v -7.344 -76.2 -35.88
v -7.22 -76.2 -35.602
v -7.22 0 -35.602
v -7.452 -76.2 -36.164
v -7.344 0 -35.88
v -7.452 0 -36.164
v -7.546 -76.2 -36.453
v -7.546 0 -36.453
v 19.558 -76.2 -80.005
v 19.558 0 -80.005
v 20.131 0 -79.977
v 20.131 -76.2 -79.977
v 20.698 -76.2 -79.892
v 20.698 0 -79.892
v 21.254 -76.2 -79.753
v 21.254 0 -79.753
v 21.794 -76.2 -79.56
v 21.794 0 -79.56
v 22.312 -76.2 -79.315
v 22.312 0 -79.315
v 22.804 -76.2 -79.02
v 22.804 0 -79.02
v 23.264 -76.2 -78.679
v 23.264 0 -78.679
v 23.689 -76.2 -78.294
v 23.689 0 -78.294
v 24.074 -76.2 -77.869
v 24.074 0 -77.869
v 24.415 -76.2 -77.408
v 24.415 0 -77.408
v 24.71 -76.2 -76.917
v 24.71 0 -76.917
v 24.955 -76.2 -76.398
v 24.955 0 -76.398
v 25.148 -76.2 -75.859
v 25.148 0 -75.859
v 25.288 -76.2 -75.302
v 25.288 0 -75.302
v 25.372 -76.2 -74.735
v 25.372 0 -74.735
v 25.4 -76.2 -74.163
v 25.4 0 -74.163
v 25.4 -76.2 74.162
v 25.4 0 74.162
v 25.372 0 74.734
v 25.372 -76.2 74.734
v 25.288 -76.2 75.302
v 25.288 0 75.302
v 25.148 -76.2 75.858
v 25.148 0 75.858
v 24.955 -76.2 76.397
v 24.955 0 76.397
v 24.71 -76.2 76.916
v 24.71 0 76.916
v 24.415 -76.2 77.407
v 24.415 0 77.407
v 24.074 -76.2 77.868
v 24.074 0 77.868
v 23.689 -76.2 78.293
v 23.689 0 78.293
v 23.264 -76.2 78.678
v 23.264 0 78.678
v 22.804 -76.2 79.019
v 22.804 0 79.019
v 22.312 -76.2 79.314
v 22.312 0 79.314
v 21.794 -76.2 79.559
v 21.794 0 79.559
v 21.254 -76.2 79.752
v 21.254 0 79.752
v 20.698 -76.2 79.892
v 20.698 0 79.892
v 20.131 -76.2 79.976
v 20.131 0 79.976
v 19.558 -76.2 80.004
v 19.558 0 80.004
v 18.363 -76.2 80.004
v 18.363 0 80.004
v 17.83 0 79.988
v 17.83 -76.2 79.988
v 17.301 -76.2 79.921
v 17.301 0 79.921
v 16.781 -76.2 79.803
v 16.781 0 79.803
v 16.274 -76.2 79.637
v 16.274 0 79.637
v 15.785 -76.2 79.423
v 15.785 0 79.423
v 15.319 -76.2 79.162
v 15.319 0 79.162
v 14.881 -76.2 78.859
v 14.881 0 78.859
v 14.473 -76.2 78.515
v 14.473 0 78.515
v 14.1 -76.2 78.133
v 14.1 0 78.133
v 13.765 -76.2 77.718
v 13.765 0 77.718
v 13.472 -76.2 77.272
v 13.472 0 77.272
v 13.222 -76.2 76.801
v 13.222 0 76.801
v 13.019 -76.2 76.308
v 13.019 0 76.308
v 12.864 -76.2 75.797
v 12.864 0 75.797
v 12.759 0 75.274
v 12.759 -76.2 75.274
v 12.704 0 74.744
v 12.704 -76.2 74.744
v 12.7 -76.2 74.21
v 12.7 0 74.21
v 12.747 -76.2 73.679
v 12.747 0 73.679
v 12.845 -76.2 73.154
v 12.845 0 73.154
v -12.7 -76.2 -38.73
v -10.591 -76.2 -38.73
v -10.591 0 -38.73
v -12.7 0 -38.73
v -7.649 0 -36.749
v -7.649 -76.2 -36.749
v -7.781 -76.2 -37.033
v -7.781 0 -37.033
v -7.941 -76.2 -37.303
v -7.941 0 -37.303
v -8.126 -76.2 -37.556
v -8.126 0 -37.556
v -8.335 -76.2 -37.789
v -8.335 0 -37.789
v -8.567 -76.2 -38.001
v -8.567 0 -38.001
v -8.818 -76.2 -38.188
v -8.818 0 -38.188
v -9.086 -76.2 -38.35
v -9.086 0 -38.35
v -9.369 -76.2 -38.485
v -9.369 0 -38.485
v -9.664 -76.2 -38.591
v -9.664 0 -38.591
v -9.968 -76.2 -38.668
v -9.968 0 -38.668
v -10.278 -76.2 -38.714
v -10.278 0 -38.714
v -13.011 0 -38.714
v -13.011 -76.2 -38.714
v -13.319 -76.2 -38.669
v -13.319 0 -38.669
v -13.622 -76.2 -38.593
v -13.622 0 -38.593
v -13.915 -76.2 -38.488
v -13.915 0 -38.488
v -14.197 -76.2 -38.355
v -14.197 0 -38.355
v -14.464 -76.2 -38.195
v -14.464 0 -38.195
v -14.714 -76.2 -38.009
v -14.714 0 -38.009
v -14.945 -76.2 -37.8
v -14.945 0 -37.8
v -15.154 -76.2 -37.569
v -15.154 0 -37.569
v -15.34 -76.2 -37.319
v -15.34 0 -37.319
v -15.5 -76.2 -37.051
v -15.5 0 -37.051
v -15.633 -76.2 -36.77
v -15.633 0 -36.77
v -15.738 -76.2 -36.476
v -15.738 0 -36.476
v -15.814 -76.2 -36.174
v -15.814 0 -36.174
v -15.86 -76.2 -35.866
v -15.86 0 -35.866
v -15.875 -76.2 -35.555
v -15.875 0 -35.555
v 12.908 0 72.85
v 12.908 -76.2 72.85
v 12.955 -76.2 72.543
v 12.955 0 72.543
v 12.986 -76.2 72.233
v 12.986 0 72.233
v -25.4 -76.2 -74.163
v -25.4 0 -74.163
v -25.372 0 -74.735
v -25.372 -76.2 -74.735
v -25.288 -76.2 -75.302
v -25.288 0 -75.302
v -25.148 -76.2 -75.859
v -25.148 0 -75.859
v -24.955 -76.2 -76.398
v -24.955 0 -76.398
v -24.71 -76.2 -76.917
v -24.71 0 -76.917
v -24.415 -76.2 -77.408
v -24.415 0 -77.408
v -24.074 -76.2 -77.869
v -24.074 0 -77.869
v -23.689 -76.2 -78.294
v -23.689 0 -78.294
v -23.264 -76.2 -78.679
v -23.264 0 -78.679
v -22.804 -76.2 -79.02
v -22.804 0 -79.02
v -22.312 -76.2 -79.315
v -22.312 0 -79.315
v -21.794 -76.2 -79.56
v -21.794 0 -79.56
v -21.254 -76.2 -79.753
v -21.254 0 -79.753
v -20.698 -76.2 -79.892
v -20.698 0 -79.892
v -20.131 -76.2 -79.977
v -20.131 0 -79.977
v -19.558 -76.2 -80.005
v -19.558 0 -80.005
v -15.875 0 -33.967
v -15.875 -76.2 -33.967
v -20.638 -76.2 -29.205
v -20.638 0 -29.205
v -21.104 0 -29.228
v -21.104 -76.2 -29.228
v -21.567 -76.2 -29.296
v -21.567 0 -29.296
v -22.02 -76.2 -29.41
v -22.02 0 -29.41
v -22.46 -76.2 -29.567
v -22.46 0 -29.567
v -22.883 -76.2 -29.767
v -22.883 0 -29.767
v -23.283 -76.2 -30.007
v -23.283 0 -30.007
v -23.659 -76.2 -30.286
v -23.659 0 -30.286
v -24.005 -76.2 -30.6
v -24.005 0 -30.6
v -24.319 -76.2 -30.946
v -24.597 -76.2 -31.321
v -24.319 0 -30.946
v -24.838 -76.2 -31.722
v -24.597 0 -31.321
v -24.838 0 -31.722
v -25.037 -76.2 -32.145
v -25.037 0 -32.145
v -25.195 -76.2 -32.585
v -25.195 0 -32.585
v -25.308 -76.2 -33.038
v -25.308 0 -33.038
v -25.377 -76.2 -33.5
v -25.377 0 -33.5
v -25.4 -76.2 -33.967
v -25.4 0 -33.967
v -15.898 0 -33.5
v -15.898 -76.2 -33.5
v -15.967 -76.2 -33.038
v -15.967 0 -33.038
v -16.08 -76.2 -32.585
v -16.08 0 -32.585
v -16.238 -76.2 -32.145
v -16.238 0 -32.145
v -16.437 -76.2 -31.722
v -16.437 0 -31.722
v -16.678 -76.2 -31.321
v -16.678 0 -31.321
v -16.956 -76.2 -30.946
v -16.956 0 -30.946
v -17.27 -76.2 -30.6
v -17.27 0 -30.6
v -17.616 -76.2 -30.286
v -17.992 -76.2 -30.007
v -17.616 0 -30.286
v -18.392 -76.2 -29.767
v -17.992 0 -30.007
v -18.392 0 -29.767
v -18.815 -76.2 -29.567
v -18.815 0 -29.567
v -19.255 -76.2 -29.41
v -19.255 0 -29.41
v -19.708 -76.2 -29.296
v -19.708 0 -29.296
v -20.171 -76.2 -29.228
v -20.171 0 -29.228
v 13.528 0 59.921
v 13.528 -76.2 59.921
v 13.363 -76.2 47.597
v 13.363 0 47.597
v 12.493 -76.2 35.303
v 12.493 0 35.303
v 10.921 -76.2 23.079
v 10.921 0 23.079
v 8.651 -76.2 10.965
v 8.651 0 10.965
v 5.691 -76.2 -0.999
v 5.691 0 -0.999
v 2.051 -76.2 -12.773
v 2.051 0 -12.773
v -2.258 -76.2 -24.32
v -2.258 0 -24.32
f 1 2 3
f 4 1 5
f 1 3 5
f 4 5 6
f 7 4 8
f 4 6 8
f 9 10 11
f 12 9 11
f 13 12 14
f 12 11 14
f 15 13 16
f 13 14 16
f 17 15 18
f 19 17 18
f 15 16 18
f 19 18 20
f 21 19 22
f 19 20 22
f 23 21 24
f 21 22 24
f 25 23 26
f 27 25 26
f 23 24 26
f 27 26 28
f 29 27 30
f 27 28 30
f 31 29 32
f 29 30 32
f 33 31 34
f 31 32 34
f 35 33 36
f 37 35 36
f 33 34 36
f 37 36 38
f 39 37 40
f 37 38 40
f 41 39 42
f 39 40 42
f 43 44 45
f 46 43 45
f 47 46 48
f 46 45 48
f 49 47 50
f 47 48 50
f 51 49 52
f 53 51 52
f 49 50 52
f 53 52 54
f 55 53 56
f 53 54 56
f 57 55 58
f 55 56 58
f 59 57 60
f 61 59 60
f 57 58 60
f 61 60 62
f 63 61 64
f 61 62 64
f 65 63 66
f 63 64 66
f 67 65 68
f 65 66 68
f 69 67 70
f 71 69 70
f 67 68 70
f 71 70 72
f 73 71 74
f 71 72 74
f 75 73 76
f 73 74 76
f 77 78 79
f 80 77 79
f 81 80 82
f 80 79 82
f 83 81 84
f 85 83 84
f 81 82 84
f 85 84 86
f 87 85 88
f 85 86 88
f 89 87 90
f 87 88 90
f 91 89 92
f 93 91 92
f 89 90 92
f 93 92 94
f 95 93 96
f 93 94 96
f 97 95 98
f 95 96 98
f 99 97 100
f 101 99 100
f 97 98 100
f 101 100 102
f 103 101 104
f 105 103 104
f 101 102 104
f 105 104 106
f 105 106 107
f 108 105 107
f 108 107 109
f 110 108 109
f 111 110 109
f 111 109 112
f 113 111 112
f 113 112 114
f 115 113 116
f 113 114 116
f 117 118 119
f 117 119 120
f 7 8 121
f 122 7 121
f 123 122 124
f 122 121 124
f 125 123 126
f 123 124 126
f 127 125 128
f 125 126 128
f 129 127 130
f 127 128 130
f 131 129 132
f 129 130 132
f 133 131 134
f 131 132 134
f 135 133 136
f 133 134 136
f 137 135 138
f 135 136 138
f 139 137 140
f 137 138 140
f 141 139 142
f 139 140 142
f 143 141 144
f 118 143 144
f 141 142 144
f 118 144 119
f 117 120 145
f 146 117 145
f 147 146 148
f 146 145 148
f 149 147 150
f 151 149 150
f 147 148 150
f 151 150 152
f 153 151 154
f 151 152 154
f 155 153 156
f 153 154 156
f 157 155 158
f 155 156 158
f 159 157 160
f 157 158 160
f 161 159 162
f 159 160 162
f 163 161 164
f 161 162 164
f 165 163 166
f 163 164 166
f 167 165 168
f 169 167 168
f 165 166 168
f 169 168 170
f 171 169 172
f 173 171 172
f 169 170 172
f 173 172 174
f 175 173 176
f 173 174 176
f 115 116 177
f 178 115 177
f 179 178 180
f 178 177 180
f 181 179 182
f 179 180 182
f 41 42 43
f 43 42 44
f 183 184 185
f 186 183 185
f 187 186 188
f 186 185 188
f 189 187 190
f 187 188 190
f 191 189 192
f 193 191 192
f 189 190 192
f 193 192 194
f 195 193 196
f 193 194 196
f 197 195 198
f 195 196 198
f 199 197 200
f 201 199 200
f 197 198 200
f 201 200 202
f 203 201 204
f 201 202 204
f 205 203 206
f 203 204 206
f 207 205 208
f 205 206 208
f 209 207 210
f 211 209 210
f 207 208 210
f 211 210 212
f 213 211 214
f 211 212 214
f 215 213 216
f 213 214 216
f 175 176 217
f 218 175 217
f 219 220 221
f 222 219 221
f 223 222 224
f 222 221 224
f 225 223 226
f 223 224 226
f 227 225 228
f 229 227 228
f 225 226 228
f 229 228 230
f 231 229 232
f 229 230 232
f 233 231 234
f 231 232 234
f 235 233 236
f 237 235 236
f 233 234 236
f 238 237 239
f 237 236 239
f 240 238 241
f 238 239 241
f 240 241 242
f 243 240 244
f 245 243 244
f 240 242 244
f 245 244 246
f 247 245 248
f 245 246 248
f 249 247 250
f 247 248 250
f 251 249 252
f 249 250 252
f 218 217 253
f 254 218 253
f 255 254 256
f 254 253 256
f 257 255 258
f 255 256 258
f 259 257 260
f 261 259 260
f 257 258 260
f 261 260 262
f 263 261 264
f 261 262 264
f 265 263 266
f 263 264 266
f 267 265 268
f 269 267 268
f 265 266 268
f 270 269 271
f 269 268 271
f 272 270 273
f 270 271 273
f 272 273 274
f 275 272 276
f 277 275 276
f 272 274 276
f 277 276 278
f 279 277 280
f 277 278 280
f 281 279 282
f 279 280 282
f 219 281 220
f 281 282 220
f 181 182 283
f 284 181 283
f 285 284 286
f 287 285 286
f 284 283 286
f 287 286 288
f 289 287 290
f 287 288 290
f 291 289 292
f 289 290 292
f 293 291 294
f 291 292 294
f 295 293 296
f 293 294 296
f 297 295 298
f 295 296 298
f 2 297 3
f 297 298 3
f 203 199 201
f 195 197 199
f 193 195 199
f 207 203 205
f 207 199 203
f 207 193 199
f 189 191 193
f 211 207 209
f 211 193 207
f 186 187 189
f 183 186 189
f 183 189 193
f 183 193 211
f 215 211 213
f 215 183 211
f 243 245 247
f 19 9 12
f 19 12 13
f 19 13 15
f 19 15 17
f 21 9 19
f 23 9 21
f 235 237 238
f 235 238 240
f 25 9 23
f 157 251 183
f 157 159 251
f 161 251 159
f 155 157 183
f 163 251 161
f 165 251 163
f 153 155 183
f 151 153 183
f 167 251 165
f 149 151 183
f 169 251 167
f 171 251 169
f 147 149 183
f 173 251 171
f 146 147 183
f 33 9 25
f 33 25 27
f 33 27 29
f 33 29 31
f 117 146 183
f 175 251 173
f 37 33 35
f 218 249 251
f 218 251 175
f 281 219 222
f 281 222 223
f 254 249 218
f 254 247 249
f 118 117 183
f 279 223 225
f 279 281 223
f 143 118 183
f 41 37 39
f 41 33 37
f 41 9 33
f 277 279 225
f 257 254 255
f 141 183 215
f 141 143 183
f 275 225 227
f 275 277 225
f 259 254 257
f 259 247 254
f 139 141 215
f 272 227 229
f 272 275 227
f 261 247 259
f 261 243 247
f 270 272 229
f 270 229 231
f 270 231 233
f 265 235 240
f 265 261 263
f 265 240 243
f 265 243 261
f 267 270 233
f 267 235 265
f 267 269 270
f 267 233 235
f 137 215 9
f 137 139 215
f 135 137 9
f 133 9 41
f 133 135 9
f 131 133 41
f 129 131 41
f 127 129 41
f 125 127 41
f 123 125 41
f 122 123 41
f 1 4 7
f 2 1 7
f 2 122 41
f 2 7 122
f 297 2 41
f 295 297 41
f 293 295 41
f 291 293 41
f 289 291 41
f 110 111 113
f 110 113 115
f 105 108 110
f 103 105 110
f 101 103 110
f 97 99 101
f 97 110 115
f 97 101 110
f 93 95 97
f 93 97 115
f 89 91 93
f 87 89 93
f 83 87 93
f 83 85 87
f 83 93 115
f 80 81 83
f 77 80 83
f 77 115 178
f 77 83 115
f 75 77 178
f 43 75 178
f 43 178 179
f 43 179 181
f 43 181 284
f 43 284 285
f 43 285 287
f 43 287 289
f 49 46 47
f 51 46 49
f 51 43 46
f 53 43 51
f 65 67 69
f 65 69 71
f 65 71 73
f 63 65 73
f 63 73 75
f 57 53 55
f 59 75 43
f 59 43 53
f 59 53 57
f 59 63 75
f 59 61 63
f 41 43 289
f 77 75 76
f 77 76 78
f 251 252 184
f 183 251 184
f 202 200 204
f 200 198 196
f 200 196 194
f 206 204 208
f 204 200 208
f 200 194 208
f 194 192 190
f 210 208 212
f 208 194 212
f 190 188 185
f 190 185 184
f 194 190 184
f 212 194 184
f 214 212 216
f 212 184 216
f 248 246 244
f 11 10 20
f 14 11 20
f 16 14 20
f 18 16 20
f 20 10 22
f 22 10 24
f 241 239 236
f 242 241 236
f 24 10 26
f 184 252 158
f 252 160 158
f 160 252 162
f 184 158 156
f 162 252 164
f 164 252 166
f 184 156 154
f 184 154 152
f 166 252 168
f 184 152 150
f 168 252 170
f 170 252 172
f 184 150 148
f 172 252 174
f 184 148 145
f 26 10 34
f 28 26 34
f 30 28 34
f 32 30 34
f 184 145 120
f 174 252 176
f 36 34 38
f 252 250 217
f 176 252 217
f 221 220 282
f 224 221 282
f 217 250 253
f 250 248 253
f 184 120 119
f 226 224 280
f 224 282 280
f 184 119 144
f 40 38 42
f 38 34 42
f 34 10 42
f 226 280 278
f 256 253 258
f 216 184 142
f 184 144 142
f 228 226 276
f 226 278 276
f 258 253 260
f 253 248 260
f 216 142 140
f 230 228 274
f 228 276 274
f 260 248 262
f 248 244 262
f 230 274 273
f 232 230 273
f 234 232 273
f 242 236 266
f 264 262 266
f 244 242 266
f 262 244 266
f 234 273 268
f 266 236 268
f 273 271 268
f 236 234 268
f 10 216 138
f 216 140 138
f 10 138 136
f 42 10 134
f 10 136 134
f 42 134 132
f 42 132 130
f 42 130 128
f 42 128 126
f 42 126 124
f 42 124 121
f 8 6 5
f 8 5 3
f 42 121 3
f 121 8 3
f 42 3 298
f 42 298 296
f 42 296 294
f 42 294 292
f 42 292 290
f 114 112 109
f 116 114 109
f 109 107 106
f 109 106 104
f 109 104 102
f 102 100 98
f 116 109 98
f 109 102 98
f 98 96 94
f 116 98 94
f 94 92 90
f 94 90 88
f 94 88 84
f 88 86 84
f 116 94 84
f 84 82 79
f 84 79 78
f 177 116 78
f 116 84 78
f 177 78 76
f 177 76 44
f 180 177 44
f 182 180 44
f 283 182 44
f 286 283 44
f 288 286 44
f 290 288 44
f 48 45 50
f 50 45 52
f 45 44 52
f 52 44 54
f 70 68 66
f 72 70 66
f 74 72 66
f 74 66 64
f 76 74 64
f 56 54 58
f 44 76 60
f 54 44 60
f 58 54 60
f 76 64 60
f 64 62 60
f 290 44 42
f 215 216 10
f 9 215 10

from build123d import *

# Parameters (mm, degrees)
F1_DEPTH = 76.2


# Not quite as in the source:
# - ends of sketch curves that miss each other by under 0.0002 mm in the source are joined


with BuildPart() as f1:
    # F0 (on Front) → F1 (new body)
    with BuildSketch(Plane.XZ):
        with BuildLine():
            Line((-25.4, -33.9672422), (-25.4, -74.1627422))
            ThreePointArc((-25.4, -74.1627422), (-23.6889178157, -78.2936600157), (-19.558, -80.0047422))
            Line((-19.558, -80.0047422), (19.558, -80.0047422))
            ThreePointArc((19.558, -80.0047422), (23.6889178157, -78.2936600157), (25.4, -74.1627422))
            Line((25.4, -74.1627422), (25.4, 74.1618532))
            ThreePointArc((25.4, 74.1618532), (23.6889178157, 78.2927710157), (19.558, 80.0038532))
            Line((19.558, 80.0038532), (18.3634634, 80.0038532))
            ThreePointArc((18.3634634, 80.0038532), (13.9275587532, 77.9297664461), (12.844644278, 73.1541629443))
            ThreePointArc((12.844644278, 73.1541629443), (12.9337447112, 72.6965968013), (12.9860822326, 72.2333837478))
            ThreePointArc((12.9860822326, 72.2333837478), (9.8726352632, 17.0060097148), (-7.2204417887, -35.601816093))
            ThreePointArc((-7.2204417887, -35.601816093), (-7.3997485398, -36.0211585586), (-7.5457824697, -36.4532160254))
            ThreePointArc((-7.5457824697, -36.4532160254), (-8.6899630694, -38.0977002575), (-10.5910126, -38.7297422))
            Line((-10.5910126, -38.7297422), (-12.7, -38.7297422))
            ThreePointArc((-12.7, -38.7297422), (-14.9450640303, -37.7998062303), (-15.875, -35.5547422))
            Line((-15.875, -35.5547422), (-15.875, -33.9672422))
            ThreePointArc((-15.875, -33.9672422), (-17.2699039546, -30.5996461546), (-20.6375, -29.2047422))
            ThreePointArc((-20.6375, -29.2047422), (-24.0050960454, -30.5996461546), (-25.4, -33.9672422))
        make_face()
    extrude(amount=F1_DEPTH)


solid = f1.part
